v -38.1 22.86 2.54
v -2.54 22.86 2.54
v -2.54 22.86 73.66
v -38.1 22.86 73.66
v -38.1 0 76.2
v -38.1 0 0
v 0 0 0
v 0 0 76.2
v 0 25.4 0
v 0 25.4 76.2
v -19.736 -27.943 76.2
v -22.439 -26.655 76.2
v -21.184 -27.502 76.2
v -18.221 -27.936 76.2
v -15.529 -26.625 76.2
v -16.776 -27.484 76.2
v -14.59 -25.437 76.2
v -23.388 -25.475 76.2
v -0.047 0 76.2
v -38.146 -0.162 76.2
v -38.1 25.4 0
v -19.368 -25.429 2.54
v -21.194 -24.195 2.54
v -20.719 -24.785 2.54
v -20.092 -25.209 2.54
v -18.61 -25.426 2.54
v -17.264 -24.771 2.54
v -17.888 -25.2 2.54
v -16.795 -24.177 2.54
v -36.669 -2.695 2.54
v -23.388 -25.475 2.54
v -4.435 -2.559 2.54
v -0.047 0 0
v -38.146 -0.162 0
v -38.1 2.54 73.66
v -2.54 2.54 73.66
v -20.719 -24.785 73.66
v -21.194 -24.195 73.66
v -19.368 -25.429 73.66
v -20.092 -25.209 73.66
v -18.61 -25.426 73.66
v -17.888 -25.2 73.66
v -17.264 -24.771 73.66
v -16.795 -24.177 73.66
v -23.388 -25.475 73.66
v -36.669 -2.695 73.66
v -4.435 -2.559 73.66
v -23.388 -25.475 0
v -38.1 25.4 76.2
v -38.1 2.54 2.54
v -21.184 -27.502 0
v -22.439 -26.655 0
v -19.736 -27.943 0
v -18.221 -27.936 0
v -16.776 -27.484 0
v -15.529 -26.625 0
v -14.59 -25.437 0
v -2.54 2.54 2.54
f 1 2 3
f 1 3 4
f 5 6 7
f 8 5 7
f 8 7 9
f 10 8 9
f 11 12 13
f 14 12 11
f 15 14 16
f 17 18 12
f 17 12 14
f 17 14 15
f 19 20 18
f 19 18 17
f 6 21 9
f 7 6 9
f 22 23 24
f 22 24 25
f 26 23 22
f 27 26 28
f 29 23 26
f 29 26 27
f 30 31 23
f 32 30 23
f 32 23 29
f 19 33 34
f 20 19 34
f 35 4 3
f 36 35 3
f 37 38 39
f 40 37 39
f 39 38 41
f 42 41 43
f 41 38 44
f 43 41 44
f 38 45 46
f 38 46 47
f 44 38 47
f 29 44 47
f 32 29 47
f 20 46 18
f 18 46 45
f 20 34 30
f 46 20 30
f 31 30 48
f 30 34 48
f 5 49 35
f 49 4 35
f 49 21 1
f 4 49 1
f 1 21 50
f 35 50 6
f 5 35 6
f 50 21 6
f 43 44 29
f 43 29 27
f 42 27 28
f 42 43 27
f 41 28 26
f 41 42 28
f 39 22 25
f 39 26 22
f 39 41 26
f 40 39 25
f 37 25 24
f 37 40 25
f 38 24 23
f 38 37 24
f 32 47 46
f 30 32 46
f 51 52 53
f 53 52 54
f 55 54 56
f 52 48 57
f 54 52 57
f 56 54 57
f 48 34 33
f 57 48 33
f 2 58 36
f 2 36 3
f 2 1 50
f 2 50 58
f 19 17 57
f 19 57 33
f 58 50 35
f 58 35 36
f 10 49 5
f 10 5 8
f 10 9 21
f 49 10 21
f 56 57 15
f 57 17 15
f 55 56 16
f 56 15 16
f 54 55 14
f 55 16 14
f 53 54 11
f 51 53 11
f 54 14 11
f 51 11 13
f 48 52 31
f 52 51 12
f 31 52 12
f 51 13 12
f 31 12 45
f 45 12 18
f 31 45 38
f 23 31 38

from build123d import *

# Parameters (mm, degrees)
F1_DEPTH = 76.2
F2_R     = 5.08
F3_T     = -2.54
F3_2_T   = 2.54


# Not quite as in the source:
# - a shell that OpenCascade refuses in one call is made with other operations: the cavity is built on its own and cut out


with BuildPart() as f1:
    # F0 (on Top) → F1 (new body)
    with BuildSketch(Plane.XY):
        Polygon((-18.9566183835, -33.0760292709), (-0.0466663034, 0), (-38.1463239484, -0.1615157497), align=None)
    extrude(amount=F1_DEPTH)

    # F2
    f2_edges = [f1.edges().sort_by_distance(p)[0] for p in [
        (-18.956618, -33.076029, 38.1),
    ]]
    fillet(f2_edges, radius=F2_R)

    # F3#2: shell of thickness 2.54, made by hand


with BuildPart() as f1b:
    # F0 (on Top) → F1, piece 2 (new body)
    with BuildSketch(Plane.XY):
        Polygon((-0.0466663034, 0), (0, 0), (0, 25.4), (-38.1, 25.4), (-38.1, 0), align=None)
    extrude(amount=F1_DEPTH)

    # F3
    f3_openings = [f1b.faces().sort_by_distance(p)[0] for p in [
        (-38.1, 12.7, 38.1),
    ]]
    offset(amount=F3_T, openings=f3_openings)


with BuildPart() as f3_2_core1:
    # F3_2_t2: copy of F1
    add(f1.part)

    # the walls: a layer under each face that stays
    f3_2_faces = [f3_2_core1.faces().sort_by_distance(p)[0] for p in [
        (-19.0964951259, -13.9980602828, 0),
        (-18.9781538168, -27.9960749182, 38.1),
        (-19.0964951259, -0.0807578749, 38.1),
        (-19.0964951259, -13.9980602828, 76.2),
        (-7.3181091587, -12.7187237548, 38.1),
    ]]
    thicken(f3_2_faces, amount=-F3_2_T, mode=Mode.SUBTRACT)


with BuildPart() as f1_1:
    add(f1.part)

    # what is left inside the walls is the cavity
    f3_2_cavity = [f3_2_core1.part.solids().sort_by_distance(p)[0] for p in [
        (-20.552076, -2.652352, 49.953333),
    ]]
    add(f3_2_cavity, mode=Mode.SUBTRACT)


solid = Compound([f1b.part, f1_1.part])
